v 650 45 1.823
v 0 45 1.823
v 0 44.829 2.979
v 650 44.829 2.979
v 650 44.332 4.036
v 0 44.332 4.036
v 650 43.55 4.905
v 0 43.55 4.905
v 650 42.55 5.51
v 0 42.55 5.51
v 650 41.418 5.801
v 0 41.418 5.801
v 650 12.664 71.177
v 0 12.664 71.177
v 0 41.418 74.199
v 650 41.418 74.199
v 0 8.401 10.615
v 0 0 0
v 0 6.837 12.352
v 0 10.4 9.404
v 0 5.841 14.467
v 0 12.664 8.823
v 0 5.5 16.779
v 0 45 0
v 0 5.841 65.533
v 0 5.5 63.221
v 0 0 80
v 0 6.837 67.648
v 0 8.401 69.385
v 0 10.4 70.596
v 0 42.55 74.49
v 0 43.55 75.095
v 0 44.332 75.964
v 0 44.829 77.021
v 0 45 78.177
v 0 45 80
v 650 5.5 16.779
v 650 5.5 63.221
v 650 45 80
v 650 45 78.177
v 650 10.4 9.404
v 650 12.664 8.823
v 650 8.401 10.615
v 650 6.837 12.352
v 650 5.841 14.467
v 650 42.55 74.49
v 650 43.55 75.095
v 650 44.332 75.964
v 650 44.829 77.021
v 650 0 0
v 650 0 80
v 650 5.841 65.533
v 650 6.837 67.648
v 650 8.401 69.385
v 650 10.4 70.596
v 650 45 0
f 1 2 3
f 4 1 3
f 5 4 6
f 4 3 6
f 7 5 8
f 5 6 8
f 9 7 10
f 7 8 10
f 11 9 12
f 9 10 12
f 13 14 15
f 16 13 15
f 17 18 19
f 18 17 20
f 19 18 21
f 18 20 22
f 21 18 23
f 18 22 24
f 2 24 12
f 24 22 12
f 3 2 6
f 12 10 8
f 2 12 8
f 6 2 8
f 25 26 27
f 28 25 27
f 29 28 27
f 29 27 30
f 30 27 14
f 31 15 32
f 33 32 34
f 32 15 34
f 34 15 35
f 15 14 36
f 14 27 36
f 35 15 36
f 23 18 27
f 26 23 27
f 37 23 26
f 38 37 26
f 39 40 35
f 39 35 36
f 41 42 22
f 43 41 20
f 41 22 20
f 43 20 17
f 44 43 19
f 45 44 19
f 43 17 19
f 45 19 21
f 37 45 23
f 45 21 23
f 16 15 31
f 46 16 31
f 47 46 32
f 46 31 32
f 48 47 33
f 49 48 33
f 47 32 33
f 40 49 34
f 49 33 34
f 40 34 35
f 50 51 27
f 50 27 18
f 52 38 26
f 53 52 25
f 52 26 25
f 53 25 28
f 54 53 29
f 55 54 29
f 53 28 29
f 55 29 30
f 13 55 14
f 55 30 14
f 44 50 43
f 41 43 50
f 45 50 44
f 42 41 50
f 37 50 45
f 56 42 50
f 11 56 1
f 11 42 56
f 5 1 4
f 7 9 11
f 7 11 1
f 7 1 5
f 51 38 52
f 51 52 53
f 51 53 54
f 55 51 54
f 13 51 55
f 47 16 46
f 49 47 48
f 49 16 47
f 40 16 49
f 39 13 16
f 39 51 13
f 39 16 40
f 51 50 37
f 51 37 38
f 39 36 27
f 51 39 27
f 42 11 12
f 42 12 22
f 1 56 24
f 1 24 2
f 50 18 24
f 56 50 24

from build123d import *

# Parameters (mm, degrees)
CANAL_C_80_X_8_1_DEPTH = 650


with BuildPart() as part:
    # Sketch15 → Canal c 80 X 8(1) (new body)
    with BuildSketch(Plane.YZ):
        with BuildLine():
            Line((45, 80), (0, 80))
            Line((0, 80), (0, 0))
            Line((0, 0), (45, 0))
            Line((45, 0), (45, 1.822575175))
            ThreePointArc((45, 1.822575175), (43.972579302, 4.499097601), (41.418113853, 5.800662757))
            Line((41.418113853, 5.800662757), (12.663772294, 8.822865837))
            ThreePointArc((12.663772294, 8.822865837), (7.554841396, 11.425996149), (5.5, 16.779041))
            Line((5.5, 16.779041), (5.5, 63.220959))
            ThreePointArc((5.5, 63.220959), (7.554841396, 68.574003851), (12.663772294, 71.177134163))
            Line((12.663772294, 71.177134163), (41.418113853, 74.199337243))
            ThreePointArc((41.418113853, 74.199337243), (43.972579302, 75.500902399), (45, 78.177424825))
            Line((45, 78.177424825), (45, 80))
        make_face()
    extrude(amount=CANAL_C_80_X_8_1_DEPTH)


solid = part.part
